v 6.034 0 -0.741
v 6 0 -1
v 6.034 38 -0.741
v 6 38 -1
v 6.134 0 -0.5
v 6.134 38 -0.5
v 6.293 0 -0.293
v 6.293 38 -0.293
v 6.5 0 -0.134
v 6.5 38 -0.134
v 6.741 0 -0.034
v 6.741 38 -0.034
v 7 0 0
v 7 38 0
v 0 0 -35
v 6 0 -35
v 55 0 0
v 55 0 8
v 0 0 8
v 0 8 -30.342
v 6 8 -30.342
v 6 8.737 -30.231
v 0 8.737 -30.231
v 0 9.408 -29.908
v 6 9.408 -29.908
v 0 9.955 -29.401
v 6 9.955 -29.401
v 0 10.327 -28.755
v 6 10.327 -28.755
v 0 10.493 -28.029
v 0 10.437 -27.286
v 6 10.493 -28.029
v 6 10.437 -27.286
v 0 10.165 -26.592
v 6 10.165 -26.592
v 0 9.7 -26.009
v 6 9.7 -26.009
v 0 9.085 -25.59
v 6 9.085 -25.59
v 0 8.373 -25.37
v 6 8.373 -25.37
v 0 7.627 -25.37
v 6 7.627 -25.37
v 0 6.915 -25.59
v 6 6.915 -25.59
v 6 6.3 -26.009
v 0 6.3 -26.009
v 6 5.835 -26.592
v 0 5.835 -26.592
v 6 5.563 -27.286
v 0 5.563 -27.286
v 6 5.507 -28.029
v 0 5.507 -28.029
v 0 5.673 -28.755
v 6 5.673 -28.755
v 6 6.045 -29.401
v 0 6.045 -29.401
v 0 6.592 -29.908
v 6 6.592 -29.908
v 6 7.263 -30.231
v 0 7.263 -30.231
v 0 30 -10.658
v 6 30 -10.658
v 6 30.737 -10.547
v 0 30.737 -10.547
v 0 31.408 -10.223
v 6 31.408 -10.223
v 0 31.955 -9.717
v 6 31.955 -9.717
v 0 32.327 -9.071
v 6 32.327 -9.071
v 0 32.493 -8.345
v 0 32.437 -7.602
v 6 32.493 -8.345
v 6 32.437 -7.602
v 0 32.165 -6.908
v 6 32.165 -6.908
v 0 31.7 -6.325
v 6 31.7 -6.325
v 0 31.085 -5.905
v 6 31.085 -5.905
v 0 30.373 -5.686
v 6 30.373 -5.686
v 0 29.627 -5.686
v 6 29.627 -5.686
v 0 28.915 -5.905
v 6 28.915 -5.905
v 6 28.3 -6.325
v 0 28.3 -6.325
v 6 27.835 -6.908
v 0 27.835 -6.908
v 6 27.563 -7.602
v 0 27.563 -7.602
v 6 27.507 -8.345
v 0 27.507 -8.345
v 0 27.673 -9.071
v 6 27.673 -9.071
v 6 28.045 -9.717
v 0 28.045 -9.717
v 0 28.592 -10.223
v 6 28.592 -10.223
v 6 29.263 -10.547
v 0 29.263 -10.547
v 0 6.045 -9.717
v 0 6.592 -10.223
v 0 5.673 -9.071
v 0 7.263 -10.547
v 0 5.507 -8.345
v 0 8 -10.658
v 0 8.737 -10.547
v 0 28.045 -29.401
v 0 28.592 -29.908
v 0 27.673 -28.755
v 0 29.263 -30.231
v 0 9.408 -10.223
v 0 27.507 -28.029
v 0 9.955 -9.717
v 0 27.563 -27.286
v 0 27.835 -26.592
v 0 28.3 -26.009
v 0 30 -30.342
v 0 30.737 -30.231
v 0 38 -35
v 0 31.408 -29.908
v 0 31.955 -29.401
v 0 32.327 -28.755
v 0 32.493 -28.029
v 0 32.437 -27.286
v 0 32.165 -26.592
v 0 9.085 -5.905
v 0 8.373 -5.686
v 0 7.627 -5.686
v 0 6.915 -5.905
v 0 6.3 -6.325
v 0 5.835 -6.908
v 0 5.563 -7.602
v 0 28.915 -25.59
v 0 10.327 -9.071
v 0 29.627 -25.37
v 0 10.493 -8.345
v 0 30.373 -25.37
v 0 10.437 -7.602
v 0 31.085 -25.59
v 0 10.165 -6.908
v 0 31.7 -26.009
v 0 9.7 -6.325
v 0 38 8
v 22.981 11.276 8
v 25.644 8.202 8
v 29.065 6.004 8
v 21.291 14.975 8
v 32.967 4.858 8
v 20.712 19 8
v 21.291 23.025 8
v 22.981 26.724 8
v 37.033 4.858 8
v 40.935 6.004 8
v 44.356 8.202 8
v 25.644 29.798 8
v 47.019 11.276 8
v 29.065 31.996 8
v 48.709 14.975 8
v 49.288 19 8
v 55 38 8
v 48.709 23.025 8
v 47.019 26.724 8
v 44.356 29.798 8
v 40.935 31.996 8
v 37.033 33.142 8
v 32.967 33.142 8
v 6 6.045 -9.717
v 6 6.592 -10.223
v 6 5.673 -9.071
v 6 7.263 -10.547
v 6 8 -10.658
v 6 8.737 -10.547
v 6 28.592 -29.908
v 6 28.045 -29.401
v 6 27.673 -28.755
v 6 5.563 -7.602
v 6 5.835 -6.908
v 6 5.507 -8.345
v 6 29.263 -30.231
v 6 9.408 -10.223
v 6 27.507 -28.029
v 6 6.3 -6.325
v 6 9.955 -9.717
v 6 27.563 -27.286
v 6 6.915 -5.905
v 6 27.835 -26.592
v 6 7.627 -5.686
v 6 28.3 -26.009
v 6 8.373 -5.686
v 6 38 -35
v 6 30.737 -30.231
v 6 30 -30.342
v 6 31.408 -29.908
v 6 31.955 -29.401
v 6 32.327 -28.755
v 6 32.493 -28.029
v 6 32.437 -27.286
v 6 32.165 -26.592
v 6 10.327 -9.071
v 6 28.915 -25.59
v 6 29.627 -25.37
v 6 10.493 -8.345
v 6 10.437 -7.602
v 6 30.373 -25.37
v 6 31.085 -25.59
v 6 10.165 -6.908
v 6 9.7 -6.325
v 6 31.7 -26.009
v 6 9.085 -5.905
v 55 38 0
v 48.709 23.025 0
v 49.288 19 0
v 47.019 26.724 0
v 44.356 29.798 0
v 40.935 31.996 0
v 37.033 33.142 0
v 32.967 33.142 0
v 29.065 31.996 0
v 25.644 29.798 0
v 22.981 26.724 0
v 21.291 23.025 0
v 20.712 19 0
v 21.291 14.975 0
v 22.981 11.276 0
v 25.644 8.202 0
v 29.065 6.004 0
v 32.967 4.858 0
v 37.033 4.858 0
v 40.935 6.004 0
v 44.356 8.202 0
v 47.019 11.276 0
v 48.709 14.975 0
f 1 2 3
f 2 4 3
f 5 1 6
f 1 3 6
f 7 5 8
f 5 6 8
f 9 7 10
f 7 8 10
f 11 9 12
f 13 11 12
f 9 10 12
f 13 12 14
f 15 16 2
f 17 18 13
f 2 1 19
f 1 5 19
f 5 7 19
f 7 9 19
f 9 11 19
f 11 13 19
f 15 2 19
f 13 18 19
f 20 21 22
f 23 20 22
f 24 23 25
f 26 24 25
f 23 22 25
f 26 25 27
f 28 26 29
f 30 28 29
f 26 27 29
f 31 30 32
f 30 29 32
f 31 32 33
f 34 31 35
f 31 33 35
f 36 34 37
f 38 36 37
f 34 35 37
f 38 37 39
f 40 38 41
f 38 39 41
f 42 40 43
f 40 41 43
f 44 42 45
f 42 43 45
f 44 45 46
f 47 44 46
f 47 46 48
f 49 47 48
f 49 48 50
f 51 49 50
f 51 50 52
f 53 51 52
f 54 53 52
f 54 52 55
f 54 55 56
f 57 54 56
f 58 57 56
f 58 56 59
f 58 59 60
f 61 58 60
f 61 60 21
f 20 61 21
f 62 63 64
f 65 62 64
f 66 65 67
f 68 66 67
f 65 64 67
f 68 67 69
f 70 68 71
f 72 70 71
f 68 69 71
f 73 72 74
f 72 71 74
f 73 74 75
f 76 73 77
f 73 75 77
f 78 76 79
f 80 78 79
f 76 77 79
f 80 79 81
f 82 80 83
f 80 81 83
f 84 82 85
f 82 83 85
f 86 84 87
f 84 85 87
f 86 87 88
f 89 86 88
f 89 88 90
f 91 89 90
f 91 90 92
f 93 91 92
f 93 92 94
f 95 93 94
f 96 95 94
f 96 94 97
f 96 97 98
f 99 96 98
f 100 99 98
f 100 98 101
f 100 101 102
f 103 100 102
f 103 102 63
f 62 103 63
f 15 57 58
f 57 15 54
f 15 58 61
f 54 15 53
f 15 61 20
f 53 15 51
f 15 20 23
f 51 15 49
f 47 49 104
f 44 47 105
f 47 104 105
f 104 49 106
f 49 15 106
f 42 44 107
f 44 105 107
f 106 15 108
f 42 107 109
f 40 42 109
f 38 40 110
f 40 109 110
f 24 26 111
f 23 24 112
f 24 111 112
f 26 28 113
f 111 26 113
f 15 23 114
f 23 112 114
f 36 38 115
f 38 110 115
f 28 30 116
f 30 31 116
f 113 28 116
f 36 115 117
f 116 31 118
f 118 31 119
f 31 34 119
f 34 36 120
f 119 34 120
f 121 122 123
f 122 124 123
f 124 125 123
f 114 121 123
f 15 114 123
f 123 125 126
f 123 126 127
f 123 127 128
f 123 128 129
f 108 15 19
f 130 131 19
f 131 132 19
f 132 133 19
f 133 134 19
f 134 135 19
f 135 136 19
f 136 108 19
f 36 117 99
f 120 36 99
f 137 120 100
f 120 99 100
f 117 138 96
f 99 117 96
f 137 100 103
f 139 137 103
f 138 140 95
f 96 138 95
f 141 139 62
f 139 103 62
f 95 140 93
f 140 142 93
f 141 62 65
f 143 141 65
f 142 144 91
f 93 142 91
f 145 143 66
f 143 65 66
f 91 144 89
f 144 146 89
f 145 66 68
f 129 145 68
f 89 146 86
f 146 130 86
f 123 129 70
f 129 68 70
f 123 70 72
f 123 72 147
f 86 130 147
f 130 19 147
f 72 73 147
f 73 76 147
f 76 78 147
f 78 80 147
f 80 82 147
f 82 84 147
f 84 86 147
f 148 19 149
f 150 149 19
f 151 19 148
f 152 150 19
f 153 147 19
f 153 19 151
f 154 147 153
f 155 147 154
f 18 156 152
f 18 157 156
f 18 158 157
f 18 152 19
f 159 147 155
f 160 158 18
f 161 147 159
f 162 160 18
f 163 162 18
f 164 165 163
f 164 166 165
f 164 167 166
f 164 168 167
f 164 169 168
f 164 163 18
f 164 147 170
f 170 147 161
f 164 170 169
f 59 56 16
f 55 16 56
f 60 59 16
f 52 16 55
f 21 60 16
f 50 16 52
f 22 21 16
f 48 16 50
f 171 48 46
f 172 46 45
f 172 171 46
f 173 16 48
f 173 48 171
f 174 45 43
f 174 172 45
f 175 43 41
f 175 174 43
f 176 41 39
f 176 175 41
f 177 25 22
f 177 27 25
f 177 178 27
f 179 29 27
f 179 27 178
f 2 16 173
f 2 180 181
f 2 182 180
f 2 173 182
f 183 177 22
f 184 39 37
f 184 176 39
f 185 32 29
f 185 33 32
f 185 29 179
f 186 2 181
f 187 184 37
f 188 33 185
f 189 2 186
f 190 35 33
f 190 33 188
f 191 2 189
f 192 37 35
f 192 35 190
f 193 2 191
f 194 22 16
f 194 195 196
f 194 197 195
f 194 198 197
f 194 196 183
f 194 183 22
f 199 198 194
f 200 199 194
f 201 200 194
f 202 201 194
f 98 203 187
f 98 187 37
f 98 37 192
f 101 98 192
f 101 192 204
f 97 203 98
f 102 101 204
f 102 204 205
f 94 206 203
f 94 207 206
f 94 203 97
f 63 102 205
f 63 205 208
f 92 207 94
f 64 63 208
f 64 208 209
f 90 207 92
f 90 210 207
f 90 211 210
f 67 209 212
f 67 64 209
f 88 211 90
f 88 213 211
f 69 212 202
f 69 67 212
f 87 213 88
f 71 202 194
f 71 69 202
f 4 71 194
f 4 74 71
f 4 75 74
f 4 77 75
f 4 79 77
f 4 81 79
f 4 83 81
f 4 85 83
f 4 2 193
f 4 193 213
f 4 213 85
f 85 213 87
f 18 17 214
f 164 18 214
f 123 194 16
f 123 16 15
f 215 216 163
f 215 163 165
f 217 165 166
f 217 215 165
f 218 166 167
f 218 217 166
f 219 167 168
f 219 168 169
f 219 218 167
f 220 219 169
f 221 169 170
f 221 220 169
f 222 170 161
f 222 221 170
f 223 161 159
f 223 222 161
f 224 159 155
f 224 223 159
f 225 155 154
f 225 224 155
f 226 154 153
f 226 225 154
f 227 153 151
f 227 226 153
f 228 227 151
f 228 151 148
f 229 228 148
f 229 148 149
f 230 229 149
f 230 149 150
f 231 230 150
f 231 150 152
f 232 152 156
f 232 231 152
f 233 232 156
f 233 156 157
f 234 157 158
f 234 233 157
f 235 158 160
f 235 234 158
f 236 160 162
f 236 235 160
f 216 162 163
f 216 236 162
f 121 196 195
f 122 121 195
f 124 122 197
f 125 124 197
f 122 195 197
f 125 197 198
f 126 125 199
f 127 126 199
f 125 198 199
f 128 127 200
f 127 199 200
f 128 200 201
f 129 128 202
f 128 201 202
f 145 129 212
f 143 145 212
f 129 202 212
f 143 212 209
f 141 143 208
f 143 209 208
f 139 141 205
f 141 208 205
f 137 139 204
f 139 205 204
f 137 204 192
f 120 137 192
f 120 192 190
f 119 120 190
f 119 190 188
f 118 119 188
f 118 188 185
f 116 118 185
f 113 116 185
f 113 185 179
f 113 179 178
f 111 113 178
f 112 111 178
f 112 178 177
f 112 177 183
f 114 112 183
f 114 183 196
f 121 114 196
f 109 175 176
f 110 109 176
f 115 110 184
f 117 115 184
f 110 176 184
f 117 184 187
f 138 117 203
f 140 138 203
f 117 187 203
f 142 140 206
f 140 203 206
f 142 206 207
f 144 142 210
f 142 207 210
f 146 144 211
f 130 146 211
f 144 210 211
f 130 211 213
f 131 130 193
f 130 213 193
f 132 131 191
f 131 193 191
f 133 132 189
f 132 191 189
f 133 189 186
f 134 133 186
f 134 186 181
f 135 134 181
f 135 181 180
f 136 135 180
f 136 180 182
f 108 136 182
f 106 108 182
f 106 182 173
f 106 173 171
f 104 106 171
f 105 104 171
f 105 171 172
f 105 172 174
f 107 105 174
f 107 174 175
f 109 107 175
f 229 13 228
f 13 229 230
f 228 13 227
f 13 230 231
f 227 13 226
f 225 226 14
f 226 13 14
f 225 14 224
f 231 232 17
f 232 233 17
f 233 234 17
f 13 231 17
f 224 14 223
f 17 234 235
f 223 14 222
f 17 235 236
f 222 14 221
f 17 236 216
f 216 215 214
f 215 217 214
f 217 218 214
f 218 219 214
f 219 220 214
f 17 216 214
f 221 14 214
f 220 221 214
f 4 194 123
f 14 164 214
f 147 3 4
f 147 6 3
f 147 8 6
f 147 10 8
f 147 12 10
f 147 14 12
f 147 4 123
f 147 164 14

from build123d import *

# Parameters (mm, degrees)
SKETCH1_W           = 55
SKETCH1_H           = 38
SKETCH1_R           = 14.2875
BOSS_EXTRUDE3_DEPTH = 8
SKETCH8_W           = 6
SKETCH8_H           = 38
BOSS_EXTRUDE6_DEPTH = 35
FILLET1_R           = 1
SKETCH9_R           = 2.5
CUT_EXTRUDE1_DEPTH  = 10


with BuildPart() as part:
    # Sketch1 → Boss-Extrude3 (new body)
    with BuildSketch(Plane.XY):
        with Locations((27.5, 19)):
            Rectangle(SKETCH1_W, SKETCH1_H)
        with Locations((35, 19)):
            Circle(SKETCH1_R, mode=Mode.SUBTRACT)
    extrude(amount=BOSS_EXTRUDE3_DEPTH)

    # Sketch8 → Boss-Extrude6 (add)
    with BuildSketch(Plane(origin=(0, 0, 0), x_dir=(-1, 0, 0), z_dir=(0, 0, -1))):
        with Locations((-3, 19)):
            Rectangle(SKETCH8_W, SKETCH8_H)
    extrude(amount=BOSS_EXTRUDE6_DEPTH)

    # Fillet1
    fillet1_edges = [part.edges().sort_by_distance(p)[0] for p in [
        (6, 19, 0),
    ]]
    fillet(fillet1_edges, radius=FILLET1_R)

    # Sketch9 → Cut-Extrude1 (cut)
    with BuildSketch(Plane(origin=(6, 0, 0), x_dir=(0, 0, -1), z_dir=(1, 0, 0))):
        with Locations((8.157894737, 30)):
            Circle(SKETCH9_R)
        with Locations((8.157894737, 8)):
            Circle(SKETCH9_R)
        with Locations((27.842105263, 8)):
            Circle(SKETCH9_R)
        with Locations((27.842105263, 30)):
            Circle(SKETCH9_R)
    extrude(amount=-CUT_EXTRUDE1_DEPTH, mode=Mode.SUBTRACT)


solid = part.part
